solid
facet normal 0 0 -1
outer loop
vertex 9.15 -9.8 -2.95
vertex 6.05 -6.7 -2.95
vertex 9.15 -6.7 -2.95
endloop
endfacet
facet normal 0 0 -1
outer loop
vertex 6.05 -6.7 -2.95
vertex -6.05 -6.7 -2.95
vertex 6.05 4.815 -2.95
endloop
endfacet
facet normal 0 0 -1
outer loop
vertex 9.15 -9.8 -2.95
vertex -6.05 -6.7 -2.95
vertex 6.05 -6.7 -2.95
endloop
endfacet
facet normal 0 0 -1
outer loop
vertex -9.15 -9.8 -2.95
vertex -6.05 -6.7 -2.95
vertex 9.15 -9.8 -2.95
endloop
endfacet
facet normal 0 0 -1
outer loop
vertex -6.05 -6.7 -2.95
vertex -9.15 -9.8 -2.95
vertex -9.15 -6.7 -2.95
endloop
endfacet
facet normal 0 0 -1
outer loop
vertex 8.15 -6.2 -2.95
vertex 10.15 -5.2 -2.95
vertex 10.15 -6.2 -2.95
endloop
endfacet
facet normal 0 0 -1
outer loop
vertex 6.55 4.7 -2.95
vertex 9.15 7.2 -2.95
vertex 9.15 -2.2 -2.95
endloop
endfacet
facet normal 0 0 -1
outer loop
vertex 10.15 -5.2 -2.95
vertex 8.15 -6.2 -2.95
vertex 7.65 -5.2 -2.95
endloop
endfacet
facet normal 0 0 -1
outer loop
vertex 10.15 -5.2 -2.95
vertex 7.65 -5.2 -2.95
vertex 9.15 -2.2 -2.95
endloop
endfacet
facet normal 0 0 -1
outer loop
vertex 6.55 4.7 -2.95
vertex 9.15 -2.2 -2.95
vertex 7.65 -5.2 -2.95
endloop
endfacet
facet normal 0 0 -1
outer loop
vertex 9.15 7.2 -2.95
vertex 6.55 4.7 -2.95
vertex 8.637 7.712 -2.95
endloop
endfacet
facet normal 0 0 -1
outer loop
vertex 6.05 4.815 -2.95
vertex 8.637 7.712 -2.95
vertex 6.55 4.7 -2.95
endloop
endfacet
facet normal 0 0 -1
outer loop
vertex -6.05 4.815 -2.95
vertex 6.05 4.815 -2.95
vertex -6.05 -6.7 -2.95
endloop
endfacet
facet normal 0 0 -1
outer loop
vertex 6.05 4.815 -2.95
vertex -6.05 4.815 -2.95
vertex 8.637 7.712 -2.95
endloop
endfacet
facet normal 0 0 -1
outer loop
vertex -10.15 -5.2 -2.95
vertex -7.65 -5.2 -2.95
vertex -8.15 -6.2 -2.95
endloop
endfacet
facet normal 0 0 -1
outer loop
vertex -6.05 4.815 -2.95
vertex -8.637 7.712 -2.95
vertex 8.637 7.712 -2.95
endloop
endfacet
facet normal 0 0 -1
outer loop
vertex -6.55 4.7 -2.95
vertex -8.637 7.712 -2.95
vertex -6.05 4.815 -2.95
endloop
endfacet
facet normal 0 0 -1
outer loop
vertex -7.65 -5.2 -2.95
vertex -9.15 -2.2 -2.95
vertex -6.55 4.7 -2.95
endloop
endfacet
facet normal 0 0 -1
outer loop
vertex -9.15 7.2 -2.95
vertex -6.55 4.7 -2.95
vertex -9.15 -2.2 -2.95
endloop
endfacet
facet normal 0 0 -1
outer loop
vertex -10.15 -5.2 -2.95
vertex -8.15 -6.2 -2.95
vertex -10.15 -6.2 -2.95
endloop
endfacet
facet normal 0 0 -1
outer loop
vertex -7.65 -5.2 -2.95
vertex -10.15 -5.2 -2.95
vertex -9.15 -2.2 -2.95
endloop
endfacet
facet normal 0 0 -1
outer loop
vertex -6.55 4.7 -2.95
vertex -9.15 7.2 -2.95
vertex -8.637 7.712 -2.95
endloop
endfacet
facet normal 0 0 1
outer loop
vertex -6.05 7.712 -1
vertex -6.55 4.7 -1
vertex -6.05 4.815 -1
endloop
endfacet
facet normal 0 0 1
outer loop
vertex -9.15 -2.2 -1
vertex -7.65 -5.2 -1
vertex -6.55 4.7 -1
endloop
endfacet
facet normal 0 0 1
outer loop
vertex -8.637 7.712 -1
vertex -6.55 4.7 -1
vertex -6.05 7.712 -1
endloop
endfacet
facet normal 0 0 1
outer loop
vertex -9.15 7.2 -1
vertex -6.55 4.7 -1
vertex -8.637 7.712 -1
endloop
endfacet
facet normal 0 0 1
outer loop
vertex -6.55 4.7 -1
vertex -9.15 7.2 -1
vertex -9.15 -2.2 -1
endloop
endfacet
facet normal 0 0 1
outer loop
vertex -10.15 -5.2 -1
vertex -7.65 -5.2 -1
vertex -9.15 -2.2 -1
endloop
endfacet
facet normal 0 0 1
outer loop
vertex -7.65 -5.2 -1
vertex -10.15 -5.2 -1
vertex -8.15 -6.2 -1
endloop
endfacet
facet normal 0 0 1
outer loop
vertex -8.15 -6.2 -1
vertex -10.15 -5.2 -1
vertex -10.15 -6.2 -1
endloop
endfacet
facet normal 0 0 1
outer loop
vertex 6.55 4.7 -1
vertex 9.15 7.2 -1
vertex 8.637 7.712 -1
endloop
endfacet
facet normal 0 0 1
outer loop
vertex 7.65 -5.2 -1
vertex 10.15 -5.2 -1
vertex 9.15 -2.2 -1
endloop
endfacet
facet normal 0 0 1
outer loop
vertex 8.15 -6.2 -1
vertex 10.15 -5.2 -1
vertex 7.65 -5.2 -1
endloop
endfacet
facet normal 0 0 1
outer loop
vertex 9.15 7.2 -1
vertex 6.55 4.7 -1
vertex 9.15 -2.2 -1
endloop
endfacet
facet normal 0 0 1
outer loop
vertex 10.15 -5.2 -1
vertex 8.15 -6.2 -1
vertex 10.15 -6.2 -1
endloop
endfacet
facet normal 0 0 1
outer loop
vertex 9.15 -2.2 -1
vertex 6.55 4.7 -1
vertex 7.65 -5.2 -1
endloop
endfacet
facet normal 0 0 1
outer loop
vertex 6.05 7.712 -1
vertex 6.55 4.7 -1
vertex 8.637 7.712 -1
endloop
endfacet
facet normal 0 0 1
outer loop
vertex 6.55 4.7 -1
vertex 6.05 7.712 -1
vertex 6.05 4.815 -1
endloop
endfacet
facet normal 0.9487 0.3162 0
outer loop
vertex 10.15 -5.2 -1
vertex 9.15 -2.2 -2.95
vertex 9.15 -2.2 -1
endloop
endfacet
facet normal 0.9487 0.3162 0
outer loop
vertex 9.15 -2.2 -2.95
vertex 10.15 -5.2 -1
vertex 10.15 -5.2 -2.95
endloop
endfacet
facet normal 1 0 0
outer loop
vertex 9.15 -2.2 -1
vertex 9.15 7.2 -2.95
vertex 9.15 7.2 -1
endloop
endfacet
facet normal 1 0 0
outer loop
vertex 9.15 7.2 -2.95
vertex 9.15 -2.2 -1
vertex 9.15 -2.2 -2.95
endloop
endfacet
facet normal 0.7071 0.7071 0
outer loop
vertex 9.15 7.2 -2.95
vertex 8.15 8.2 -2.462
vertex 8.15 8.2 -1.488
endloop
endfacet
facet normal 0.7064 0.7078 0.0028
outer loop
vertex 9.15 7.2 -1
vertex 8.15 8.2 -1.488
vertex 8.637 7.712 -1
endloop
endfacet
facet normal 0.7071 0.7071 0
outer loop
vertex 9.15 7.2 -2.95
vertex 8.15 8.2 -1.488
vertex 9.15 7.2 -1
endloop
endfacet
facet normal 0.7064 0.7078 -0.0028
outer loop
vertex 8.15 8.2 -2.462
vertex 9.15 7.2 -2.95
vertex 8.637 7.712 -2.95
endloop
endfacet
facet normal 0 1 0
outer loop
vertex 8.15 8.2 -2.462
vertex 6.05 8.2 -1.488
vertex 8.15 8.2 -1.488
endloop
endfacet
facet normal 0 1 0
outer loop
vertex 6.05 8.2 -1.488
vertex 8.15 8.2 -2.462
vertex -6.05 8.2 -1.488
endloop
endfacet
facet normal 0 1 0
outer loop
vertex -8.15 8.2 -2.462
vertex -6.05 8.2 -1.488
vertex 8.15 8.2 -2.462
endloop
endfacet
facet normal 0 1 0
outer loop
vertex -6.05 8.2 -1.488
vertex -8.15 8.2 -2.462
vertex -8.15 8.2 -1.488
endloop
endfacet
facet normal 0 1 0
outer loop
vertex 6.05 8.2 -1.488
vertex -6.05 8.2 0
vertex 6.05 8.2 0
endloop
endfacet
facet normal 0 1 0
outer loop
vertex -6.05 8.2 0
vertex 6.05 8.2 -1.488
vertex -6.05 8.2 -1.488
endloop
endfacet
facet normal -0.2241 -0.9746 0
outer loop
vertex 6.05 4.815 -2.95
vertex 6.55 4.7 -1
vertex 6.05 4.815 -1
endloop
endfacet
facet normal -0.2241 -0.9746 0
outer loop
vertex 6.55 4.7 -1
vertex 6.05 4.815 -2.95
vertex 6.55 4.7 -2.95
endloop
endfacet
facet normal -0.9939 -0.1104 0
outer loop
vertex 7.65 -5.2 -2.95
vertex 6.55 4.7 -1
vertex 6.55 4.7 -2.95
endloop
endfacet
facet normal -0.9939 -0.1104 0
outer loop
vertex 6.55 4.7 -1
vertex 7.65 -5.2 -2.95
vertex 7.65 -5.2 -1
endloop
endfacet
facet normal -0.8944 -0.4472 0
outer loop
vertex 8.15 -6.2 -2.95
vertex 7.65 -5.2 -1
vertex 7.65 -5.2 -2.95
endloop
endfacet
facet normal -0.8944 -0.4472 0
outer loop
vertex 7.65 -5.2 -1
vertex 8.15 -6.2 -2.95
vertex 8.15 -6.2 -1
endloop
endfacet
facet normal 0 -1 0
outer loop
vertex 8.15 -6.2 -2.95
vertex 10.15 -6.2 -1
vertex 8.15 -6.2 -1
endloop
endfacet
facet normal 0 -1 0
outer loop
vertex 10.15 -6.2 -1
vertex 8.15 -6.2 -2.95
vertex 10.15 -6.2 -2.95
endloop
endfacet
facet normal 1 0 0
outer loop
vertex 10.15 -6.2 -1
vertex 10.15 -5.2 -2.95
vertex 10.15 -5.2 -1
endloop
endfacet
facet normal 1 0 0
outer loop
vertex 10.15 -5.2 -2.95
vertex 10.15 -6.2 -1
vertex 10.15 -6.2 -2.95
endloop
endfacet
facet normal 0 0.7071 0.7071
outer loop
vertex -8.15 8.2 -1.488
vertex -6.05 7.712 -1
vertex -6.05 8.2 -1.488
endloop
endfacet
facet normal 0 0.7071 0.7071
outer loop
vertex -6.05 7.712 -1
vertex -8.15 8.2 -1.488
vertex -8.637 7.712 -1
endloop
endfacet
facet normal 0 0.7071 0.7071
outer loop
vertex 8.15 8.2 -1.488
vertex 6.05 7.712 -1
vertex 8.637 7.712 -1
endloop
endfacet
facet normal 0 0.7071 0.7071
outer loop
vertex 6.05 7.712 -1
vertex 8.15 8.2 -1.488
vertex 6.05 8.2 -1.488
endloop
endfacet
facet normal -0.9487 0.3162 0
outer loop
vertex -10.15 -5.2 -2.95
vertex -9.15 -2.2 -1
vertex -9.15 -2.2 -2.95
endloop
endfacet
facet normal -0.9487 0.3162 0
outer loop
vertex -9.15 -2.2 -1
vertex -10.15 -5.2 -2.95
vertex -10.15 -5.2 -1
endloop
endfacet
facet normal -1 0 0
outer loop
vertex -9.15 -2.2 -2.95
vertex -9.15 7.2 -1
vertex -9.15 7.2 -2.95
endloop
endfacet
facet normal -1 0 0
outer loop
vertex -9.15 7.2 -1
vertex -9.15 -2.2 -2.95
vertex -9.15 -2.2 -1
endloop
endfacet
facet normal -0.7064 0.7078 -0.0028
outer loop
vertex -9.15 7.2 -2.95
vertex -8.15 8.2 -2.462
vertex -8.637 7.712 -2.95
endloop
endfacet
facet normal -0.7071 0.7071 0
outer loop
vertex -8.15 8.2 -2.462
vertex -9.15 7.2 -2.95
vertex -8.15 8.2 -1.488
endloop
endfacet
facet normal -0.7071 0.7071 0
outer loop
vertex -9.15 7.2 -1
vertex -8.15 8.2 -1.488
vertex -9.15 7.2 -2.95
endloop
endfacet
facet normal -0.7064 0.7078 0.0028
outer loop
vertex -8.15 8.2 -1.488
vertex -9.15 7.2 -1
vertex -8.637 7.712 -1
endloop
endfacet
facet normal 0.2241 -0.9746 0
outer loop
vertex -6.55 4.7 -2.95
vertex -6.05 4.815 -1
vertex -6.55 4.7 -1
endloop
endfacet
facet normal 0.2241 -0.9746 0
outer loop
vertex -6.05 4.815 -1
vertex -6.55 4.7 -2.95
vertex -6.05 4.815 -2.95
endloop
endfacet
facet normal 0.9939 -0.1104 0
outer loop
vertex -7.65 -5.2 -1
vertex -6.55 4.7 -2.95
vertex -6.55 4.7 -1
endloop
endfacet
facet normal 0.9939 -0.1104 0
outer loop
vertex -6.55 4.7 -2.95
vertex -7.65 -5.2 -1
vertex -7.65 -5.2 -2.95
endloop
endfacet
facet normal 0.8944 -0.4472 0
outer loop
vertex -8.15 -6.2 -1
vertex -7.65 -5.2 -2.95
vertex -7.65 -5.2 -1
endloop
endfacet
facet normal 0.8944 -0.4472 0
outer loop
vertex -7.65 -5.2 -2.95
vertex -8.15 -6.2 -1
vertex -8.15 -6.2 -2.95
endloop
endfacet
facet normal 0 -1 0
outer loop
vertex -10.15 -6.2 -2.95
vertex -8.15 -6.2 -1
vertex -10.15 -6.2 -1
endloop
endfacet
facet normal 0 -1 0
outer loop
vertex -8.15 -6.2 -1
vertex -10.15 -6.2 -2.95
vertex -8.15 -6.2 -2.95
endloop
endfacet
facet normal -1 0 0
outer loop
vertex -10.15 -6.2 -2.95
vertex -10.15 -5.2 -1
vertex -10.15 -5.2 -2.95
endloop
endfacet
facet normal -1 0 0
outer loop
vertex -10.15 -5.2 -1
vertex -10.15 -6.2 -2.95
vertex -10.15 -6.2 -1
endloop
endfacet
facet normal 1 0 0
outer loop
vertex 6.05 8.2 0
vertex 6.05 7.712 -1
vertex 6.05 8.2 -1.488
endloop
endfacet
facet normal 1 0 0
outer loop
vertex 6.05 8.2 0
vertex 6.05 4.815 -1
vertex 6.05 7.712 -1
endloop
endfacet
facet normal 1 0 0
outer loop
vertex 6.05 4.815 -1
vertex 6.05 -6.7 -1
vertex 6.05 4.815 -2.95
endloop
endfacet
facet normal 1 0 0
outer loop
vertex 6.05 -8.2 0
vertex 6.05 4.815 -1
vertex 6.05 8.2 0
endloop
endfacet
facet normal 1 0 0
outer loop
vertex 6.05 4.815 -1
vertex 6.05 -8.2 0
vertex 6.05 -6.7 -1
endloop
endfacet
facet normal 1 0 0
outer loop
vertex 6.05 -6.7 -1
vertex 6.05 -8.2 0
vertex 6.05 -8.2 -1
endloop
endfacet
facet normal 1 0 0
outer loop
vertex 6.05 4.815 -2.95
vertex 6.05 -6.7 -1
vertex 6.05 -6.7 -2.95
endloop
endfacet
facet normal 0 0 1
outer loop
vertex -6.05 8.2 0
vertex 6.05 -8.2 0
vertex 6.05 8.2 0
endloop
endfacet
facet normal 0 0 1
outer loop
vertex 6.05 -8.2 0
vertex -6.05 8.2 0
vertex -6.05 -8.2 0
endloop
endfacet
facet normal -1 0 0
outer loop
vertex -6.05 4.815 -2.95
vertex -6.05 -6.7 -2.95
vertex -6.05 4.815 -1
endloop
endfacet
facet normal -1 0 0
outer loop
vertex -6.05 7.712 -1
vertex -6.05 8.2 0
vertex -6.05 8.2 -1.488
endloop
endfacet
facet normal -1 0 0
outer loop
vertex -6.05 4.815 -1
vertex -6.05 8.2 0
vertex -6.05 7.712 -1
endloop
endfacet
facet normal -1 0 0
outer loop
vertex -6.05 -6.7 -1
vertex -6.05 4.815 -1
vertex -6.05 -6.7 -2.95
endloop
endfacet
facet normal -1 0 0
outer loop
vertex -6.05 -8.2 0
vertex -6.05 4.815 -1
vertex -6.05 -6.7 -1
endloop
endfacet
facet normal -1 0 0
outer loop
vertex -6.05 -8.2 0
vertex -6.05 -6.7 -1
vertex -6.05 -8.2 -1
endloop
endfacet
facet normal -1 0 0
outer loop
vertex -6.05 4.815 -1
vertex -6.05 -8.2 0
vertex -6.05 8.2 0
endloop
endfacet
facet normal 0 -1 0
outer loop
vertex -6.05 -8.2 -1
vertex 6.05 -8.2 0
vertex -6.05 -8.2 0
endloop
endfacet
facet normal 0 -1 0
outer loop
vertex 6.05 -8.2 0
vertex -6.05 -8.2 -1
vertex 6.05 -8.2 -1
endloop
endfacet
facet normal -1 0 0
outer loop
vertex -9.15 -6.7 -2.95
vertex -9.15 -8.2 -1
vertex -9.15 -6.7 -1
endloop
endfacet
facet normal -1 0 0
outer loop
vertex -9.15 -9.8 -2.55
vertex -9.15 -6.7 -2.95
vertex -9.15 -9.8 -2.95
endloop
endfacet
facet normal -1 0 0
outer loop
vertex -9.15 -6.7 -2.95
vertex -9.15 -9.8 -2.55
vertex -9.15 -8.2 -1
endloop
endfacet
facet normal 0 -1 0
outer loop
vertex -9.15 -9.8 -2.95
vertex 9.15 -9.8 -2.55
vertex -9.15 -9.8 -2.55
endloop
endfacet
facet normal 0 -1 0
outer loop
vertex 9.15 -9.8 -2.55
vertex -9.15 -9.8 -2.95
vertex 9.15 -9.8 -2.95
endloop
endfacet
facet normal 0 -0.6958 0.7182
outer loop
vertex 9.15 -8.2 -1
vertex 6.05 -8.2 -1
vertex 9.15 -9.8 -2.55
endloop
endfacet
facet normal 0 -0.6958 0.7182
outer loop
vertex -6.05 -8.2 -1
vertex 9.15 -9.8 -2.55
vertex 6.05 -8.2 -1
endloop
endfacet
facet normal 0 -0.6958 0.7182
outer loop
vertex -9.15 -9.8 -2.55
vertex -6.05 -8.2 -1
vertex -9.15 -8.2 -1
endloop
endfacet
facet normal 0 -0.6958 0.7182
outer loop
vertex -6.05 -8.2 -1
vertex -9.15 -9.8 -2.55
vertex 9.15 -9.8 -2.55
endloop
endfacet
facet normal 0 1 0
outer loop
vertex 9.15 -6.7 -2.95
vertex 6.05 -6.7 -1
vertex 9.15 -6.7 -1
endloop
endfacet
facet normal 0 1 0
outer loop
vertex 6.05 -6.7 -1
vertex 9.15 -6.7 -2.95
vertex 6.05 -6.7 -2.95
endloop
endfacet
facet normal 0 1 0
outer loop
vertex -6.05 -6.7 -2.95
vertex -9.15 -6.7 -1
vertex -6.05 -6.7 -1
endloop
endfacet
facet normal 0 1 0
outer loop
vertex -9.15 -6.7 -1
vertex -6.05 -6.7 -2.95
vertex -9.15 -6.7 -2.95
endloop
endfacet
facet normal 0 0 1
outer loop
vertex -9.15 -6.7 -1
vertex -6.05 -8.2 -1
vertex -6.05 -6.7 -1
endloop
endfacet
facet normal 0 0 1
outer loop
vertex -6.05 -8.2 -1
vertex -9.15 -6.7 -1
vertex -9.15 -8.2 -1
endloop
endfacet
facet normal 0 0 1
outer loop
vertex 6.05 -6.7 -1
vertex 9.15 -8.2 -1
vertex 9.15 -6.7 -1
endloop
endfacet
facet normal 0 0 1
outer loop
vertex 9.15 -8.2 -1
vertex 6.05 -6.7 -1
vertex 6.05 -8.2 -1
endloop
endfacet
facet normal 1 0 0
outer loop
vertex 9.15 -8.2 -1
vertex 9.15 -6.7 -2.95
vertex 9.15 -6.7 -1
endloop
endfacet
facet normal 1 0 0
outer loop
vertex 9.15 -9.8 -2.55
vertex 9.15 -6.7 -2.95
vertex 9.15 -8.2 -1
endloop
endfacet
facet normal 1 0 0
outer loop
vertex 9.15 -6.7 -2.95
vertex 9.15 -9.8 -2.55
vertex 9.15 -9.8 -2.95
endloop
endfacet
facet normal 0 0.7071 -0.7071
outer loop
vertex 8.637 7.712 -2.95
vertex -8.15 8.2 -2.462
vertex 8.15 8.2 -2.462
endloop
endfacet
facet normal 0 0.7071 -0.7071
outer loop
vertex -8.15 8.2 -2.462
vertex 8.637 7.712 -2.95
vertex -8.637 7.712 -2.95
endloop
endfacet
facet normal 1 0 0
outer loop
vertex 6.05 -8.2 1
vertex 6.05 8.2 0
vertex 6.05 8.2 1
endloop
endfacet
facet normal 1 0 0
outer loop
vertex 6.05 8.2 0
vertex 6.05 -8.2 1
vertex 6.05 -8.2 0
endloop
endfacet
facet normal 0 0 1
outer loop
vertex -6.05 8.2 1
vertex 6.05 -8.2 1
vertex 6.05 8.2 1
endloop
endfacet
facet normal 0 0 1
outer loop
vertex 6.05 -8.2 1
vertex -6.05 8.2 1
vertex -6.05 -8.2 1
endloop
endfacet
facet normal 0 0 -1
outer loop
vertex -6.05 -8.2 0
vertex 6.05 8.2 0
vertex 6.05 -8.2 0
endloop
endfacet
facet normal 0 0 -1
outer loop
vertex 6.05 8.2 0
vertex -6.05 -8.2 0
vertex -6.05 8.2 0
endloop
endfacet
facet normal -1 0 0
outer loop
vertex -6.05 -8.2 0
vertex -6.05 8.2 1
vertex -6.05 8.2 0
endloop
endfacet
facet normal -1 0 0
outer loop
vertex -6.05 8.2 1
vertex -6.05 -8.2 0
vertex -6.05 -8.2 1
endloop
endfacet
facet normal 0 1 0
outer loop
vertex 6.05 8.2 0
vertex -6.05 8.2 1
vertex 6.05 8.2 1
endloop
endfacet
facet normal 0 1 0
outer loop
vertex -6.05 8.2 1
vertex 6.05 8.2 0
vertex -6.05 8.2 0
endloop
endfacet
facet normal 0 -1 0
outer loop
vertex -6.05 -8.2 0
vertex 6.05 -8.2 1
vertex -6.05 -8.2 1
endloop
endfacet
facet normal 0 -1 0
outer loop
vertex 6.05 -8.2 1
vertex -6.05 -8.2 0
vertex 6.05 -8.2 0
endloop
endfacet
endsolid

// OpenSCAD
/*
Camera hot shoe adapter base / cover
by Alex Matulich, April 2021
on Thingiverse: https://www.thingiverse.com/thing:4832722

This is intended to be used as a base for building something else to mount on a camera hot shoe. By default, it serves as a hot shoe cover (which comes with the camera but is among the first things lost because the part is so small).

The object is rendered so that the top of the 12x16.4 pedestal (the surface on which you would mount something) is centered at [0,0,0].

The only print setting to be concerned with is the layer height. Printing at 0.25mm height gives the most accurate thicknesses for this piece. Tolerances are tight so this is important.
*/

// ---------- parts that can be made ----------

// this builds a hotshoe adapter with a pedestal sticking up 1mm, with the TOP of the pedestal centered at [0,0,0]
hotshoe_adapter(1);

// this shows ONLY a pedestal of the given height (1mm), with the BOTTOM of the pedestal centered at [0,0,0]. Useful with a hull() operation for some other mount.
color("silver") hotshoe_adapter(1, true);

// ---------- hotshoe adapter module ----------

// Internal shoe dimensions measured on a Nikon D5100:
intwid = 18.7;  // internal width of hot shoe
intlen = 18.0;  // internal length (sliding distance)
intht = 2.05;   // internal height
wingspc = 12.6; // space between wing edges
winglen = 16.4; // length of wings (sliding distance)

// parameters:
// pedestal_ht: height of center pedestal
// base_only:
//  true = show only pedestal with bottom at z=0
//  false = show adapter with TOP of pedstal at z=0
module hotshoe_adapter(pedestal_ht, base_only=false) {
    // adapter dimensions to fit in the shoe, with clerances:
    halfwid = 0.5*intwid - 0.2;
    halflen = 0.5*intlen;
    ht = intht - 0.1;
    centerspc = wingspc - 0.5;
    cliplen = winglen - 2.0;

    if (base_only) {
        // pedestal with bottom centered at [0,0,0]
        translate([0,0,0.5*pedestal_ht]) cube([centerspc, winglen, pedestal_ht], center=true);
    } else {
        translate([0,0.5*(winglen-intlen),-ht-pedestal_ht])
        difference() {
            union() {
                // pedestal with top centered at [0,0,0]
                translate([0,0.5*(intlen-winglen),0.5*(ht+pedestal_ht)]) cube([centerspc, winglen, ht+pedestal_ht], center=true);
            
                // beveled back edge
                translate([halfwid,0,0]) rotate([0,-90,0])
                linear_extrude(2*halfwid) polygon(points=[
                    [0,-halflen], [0, halflen-cliplen-0.5],
                    [ht, halflen-cliplen-0.5], [ht, halflen-winglen],
                    [0.4, -halflen]
                ]);
            
                // wing clips
                wing();
                mirror([1,0,0]) wing();
            }
            // subrract bevel from lower front edge
            frontbevel(-1);
        }
    }
    // wing clip (one side)
    module wing() {
        difference() {
            linear_extrude(ht, convexity=4) polygon(points = [
                [0, halflen], [halfwid-1, halflen], [halfwid, halflen-1],
                [halfwid, halflen-cliplen+4],
                [halfwid+1, halflen-cliplen+1],
                [halfwid+1, halflen-cliplen],
                [halfwid-1, halflen-cliplen],
                [halfwid-1.5, halflen-cliplen+1],
                [0.5*centerspc+0.5, halflen-3.5],
                [0, halflen-2]
            ]);
            frontbevel(1); // bevel top edge of wing
        }
    }

    // triangular bevel for front edge
    module frontbevel(side) { //side: 1=top, -1=bottom
        b = 2;
        translate([0,0,0.5*ht]) rotate([0,side*90,0]) translate([0,halflen+0.25*ht,-0.5*intwid-1]) linear_extrude(intwid+2) polygon(points=[[0,0], [-b,-b], [-b,0]]);
    }
}
